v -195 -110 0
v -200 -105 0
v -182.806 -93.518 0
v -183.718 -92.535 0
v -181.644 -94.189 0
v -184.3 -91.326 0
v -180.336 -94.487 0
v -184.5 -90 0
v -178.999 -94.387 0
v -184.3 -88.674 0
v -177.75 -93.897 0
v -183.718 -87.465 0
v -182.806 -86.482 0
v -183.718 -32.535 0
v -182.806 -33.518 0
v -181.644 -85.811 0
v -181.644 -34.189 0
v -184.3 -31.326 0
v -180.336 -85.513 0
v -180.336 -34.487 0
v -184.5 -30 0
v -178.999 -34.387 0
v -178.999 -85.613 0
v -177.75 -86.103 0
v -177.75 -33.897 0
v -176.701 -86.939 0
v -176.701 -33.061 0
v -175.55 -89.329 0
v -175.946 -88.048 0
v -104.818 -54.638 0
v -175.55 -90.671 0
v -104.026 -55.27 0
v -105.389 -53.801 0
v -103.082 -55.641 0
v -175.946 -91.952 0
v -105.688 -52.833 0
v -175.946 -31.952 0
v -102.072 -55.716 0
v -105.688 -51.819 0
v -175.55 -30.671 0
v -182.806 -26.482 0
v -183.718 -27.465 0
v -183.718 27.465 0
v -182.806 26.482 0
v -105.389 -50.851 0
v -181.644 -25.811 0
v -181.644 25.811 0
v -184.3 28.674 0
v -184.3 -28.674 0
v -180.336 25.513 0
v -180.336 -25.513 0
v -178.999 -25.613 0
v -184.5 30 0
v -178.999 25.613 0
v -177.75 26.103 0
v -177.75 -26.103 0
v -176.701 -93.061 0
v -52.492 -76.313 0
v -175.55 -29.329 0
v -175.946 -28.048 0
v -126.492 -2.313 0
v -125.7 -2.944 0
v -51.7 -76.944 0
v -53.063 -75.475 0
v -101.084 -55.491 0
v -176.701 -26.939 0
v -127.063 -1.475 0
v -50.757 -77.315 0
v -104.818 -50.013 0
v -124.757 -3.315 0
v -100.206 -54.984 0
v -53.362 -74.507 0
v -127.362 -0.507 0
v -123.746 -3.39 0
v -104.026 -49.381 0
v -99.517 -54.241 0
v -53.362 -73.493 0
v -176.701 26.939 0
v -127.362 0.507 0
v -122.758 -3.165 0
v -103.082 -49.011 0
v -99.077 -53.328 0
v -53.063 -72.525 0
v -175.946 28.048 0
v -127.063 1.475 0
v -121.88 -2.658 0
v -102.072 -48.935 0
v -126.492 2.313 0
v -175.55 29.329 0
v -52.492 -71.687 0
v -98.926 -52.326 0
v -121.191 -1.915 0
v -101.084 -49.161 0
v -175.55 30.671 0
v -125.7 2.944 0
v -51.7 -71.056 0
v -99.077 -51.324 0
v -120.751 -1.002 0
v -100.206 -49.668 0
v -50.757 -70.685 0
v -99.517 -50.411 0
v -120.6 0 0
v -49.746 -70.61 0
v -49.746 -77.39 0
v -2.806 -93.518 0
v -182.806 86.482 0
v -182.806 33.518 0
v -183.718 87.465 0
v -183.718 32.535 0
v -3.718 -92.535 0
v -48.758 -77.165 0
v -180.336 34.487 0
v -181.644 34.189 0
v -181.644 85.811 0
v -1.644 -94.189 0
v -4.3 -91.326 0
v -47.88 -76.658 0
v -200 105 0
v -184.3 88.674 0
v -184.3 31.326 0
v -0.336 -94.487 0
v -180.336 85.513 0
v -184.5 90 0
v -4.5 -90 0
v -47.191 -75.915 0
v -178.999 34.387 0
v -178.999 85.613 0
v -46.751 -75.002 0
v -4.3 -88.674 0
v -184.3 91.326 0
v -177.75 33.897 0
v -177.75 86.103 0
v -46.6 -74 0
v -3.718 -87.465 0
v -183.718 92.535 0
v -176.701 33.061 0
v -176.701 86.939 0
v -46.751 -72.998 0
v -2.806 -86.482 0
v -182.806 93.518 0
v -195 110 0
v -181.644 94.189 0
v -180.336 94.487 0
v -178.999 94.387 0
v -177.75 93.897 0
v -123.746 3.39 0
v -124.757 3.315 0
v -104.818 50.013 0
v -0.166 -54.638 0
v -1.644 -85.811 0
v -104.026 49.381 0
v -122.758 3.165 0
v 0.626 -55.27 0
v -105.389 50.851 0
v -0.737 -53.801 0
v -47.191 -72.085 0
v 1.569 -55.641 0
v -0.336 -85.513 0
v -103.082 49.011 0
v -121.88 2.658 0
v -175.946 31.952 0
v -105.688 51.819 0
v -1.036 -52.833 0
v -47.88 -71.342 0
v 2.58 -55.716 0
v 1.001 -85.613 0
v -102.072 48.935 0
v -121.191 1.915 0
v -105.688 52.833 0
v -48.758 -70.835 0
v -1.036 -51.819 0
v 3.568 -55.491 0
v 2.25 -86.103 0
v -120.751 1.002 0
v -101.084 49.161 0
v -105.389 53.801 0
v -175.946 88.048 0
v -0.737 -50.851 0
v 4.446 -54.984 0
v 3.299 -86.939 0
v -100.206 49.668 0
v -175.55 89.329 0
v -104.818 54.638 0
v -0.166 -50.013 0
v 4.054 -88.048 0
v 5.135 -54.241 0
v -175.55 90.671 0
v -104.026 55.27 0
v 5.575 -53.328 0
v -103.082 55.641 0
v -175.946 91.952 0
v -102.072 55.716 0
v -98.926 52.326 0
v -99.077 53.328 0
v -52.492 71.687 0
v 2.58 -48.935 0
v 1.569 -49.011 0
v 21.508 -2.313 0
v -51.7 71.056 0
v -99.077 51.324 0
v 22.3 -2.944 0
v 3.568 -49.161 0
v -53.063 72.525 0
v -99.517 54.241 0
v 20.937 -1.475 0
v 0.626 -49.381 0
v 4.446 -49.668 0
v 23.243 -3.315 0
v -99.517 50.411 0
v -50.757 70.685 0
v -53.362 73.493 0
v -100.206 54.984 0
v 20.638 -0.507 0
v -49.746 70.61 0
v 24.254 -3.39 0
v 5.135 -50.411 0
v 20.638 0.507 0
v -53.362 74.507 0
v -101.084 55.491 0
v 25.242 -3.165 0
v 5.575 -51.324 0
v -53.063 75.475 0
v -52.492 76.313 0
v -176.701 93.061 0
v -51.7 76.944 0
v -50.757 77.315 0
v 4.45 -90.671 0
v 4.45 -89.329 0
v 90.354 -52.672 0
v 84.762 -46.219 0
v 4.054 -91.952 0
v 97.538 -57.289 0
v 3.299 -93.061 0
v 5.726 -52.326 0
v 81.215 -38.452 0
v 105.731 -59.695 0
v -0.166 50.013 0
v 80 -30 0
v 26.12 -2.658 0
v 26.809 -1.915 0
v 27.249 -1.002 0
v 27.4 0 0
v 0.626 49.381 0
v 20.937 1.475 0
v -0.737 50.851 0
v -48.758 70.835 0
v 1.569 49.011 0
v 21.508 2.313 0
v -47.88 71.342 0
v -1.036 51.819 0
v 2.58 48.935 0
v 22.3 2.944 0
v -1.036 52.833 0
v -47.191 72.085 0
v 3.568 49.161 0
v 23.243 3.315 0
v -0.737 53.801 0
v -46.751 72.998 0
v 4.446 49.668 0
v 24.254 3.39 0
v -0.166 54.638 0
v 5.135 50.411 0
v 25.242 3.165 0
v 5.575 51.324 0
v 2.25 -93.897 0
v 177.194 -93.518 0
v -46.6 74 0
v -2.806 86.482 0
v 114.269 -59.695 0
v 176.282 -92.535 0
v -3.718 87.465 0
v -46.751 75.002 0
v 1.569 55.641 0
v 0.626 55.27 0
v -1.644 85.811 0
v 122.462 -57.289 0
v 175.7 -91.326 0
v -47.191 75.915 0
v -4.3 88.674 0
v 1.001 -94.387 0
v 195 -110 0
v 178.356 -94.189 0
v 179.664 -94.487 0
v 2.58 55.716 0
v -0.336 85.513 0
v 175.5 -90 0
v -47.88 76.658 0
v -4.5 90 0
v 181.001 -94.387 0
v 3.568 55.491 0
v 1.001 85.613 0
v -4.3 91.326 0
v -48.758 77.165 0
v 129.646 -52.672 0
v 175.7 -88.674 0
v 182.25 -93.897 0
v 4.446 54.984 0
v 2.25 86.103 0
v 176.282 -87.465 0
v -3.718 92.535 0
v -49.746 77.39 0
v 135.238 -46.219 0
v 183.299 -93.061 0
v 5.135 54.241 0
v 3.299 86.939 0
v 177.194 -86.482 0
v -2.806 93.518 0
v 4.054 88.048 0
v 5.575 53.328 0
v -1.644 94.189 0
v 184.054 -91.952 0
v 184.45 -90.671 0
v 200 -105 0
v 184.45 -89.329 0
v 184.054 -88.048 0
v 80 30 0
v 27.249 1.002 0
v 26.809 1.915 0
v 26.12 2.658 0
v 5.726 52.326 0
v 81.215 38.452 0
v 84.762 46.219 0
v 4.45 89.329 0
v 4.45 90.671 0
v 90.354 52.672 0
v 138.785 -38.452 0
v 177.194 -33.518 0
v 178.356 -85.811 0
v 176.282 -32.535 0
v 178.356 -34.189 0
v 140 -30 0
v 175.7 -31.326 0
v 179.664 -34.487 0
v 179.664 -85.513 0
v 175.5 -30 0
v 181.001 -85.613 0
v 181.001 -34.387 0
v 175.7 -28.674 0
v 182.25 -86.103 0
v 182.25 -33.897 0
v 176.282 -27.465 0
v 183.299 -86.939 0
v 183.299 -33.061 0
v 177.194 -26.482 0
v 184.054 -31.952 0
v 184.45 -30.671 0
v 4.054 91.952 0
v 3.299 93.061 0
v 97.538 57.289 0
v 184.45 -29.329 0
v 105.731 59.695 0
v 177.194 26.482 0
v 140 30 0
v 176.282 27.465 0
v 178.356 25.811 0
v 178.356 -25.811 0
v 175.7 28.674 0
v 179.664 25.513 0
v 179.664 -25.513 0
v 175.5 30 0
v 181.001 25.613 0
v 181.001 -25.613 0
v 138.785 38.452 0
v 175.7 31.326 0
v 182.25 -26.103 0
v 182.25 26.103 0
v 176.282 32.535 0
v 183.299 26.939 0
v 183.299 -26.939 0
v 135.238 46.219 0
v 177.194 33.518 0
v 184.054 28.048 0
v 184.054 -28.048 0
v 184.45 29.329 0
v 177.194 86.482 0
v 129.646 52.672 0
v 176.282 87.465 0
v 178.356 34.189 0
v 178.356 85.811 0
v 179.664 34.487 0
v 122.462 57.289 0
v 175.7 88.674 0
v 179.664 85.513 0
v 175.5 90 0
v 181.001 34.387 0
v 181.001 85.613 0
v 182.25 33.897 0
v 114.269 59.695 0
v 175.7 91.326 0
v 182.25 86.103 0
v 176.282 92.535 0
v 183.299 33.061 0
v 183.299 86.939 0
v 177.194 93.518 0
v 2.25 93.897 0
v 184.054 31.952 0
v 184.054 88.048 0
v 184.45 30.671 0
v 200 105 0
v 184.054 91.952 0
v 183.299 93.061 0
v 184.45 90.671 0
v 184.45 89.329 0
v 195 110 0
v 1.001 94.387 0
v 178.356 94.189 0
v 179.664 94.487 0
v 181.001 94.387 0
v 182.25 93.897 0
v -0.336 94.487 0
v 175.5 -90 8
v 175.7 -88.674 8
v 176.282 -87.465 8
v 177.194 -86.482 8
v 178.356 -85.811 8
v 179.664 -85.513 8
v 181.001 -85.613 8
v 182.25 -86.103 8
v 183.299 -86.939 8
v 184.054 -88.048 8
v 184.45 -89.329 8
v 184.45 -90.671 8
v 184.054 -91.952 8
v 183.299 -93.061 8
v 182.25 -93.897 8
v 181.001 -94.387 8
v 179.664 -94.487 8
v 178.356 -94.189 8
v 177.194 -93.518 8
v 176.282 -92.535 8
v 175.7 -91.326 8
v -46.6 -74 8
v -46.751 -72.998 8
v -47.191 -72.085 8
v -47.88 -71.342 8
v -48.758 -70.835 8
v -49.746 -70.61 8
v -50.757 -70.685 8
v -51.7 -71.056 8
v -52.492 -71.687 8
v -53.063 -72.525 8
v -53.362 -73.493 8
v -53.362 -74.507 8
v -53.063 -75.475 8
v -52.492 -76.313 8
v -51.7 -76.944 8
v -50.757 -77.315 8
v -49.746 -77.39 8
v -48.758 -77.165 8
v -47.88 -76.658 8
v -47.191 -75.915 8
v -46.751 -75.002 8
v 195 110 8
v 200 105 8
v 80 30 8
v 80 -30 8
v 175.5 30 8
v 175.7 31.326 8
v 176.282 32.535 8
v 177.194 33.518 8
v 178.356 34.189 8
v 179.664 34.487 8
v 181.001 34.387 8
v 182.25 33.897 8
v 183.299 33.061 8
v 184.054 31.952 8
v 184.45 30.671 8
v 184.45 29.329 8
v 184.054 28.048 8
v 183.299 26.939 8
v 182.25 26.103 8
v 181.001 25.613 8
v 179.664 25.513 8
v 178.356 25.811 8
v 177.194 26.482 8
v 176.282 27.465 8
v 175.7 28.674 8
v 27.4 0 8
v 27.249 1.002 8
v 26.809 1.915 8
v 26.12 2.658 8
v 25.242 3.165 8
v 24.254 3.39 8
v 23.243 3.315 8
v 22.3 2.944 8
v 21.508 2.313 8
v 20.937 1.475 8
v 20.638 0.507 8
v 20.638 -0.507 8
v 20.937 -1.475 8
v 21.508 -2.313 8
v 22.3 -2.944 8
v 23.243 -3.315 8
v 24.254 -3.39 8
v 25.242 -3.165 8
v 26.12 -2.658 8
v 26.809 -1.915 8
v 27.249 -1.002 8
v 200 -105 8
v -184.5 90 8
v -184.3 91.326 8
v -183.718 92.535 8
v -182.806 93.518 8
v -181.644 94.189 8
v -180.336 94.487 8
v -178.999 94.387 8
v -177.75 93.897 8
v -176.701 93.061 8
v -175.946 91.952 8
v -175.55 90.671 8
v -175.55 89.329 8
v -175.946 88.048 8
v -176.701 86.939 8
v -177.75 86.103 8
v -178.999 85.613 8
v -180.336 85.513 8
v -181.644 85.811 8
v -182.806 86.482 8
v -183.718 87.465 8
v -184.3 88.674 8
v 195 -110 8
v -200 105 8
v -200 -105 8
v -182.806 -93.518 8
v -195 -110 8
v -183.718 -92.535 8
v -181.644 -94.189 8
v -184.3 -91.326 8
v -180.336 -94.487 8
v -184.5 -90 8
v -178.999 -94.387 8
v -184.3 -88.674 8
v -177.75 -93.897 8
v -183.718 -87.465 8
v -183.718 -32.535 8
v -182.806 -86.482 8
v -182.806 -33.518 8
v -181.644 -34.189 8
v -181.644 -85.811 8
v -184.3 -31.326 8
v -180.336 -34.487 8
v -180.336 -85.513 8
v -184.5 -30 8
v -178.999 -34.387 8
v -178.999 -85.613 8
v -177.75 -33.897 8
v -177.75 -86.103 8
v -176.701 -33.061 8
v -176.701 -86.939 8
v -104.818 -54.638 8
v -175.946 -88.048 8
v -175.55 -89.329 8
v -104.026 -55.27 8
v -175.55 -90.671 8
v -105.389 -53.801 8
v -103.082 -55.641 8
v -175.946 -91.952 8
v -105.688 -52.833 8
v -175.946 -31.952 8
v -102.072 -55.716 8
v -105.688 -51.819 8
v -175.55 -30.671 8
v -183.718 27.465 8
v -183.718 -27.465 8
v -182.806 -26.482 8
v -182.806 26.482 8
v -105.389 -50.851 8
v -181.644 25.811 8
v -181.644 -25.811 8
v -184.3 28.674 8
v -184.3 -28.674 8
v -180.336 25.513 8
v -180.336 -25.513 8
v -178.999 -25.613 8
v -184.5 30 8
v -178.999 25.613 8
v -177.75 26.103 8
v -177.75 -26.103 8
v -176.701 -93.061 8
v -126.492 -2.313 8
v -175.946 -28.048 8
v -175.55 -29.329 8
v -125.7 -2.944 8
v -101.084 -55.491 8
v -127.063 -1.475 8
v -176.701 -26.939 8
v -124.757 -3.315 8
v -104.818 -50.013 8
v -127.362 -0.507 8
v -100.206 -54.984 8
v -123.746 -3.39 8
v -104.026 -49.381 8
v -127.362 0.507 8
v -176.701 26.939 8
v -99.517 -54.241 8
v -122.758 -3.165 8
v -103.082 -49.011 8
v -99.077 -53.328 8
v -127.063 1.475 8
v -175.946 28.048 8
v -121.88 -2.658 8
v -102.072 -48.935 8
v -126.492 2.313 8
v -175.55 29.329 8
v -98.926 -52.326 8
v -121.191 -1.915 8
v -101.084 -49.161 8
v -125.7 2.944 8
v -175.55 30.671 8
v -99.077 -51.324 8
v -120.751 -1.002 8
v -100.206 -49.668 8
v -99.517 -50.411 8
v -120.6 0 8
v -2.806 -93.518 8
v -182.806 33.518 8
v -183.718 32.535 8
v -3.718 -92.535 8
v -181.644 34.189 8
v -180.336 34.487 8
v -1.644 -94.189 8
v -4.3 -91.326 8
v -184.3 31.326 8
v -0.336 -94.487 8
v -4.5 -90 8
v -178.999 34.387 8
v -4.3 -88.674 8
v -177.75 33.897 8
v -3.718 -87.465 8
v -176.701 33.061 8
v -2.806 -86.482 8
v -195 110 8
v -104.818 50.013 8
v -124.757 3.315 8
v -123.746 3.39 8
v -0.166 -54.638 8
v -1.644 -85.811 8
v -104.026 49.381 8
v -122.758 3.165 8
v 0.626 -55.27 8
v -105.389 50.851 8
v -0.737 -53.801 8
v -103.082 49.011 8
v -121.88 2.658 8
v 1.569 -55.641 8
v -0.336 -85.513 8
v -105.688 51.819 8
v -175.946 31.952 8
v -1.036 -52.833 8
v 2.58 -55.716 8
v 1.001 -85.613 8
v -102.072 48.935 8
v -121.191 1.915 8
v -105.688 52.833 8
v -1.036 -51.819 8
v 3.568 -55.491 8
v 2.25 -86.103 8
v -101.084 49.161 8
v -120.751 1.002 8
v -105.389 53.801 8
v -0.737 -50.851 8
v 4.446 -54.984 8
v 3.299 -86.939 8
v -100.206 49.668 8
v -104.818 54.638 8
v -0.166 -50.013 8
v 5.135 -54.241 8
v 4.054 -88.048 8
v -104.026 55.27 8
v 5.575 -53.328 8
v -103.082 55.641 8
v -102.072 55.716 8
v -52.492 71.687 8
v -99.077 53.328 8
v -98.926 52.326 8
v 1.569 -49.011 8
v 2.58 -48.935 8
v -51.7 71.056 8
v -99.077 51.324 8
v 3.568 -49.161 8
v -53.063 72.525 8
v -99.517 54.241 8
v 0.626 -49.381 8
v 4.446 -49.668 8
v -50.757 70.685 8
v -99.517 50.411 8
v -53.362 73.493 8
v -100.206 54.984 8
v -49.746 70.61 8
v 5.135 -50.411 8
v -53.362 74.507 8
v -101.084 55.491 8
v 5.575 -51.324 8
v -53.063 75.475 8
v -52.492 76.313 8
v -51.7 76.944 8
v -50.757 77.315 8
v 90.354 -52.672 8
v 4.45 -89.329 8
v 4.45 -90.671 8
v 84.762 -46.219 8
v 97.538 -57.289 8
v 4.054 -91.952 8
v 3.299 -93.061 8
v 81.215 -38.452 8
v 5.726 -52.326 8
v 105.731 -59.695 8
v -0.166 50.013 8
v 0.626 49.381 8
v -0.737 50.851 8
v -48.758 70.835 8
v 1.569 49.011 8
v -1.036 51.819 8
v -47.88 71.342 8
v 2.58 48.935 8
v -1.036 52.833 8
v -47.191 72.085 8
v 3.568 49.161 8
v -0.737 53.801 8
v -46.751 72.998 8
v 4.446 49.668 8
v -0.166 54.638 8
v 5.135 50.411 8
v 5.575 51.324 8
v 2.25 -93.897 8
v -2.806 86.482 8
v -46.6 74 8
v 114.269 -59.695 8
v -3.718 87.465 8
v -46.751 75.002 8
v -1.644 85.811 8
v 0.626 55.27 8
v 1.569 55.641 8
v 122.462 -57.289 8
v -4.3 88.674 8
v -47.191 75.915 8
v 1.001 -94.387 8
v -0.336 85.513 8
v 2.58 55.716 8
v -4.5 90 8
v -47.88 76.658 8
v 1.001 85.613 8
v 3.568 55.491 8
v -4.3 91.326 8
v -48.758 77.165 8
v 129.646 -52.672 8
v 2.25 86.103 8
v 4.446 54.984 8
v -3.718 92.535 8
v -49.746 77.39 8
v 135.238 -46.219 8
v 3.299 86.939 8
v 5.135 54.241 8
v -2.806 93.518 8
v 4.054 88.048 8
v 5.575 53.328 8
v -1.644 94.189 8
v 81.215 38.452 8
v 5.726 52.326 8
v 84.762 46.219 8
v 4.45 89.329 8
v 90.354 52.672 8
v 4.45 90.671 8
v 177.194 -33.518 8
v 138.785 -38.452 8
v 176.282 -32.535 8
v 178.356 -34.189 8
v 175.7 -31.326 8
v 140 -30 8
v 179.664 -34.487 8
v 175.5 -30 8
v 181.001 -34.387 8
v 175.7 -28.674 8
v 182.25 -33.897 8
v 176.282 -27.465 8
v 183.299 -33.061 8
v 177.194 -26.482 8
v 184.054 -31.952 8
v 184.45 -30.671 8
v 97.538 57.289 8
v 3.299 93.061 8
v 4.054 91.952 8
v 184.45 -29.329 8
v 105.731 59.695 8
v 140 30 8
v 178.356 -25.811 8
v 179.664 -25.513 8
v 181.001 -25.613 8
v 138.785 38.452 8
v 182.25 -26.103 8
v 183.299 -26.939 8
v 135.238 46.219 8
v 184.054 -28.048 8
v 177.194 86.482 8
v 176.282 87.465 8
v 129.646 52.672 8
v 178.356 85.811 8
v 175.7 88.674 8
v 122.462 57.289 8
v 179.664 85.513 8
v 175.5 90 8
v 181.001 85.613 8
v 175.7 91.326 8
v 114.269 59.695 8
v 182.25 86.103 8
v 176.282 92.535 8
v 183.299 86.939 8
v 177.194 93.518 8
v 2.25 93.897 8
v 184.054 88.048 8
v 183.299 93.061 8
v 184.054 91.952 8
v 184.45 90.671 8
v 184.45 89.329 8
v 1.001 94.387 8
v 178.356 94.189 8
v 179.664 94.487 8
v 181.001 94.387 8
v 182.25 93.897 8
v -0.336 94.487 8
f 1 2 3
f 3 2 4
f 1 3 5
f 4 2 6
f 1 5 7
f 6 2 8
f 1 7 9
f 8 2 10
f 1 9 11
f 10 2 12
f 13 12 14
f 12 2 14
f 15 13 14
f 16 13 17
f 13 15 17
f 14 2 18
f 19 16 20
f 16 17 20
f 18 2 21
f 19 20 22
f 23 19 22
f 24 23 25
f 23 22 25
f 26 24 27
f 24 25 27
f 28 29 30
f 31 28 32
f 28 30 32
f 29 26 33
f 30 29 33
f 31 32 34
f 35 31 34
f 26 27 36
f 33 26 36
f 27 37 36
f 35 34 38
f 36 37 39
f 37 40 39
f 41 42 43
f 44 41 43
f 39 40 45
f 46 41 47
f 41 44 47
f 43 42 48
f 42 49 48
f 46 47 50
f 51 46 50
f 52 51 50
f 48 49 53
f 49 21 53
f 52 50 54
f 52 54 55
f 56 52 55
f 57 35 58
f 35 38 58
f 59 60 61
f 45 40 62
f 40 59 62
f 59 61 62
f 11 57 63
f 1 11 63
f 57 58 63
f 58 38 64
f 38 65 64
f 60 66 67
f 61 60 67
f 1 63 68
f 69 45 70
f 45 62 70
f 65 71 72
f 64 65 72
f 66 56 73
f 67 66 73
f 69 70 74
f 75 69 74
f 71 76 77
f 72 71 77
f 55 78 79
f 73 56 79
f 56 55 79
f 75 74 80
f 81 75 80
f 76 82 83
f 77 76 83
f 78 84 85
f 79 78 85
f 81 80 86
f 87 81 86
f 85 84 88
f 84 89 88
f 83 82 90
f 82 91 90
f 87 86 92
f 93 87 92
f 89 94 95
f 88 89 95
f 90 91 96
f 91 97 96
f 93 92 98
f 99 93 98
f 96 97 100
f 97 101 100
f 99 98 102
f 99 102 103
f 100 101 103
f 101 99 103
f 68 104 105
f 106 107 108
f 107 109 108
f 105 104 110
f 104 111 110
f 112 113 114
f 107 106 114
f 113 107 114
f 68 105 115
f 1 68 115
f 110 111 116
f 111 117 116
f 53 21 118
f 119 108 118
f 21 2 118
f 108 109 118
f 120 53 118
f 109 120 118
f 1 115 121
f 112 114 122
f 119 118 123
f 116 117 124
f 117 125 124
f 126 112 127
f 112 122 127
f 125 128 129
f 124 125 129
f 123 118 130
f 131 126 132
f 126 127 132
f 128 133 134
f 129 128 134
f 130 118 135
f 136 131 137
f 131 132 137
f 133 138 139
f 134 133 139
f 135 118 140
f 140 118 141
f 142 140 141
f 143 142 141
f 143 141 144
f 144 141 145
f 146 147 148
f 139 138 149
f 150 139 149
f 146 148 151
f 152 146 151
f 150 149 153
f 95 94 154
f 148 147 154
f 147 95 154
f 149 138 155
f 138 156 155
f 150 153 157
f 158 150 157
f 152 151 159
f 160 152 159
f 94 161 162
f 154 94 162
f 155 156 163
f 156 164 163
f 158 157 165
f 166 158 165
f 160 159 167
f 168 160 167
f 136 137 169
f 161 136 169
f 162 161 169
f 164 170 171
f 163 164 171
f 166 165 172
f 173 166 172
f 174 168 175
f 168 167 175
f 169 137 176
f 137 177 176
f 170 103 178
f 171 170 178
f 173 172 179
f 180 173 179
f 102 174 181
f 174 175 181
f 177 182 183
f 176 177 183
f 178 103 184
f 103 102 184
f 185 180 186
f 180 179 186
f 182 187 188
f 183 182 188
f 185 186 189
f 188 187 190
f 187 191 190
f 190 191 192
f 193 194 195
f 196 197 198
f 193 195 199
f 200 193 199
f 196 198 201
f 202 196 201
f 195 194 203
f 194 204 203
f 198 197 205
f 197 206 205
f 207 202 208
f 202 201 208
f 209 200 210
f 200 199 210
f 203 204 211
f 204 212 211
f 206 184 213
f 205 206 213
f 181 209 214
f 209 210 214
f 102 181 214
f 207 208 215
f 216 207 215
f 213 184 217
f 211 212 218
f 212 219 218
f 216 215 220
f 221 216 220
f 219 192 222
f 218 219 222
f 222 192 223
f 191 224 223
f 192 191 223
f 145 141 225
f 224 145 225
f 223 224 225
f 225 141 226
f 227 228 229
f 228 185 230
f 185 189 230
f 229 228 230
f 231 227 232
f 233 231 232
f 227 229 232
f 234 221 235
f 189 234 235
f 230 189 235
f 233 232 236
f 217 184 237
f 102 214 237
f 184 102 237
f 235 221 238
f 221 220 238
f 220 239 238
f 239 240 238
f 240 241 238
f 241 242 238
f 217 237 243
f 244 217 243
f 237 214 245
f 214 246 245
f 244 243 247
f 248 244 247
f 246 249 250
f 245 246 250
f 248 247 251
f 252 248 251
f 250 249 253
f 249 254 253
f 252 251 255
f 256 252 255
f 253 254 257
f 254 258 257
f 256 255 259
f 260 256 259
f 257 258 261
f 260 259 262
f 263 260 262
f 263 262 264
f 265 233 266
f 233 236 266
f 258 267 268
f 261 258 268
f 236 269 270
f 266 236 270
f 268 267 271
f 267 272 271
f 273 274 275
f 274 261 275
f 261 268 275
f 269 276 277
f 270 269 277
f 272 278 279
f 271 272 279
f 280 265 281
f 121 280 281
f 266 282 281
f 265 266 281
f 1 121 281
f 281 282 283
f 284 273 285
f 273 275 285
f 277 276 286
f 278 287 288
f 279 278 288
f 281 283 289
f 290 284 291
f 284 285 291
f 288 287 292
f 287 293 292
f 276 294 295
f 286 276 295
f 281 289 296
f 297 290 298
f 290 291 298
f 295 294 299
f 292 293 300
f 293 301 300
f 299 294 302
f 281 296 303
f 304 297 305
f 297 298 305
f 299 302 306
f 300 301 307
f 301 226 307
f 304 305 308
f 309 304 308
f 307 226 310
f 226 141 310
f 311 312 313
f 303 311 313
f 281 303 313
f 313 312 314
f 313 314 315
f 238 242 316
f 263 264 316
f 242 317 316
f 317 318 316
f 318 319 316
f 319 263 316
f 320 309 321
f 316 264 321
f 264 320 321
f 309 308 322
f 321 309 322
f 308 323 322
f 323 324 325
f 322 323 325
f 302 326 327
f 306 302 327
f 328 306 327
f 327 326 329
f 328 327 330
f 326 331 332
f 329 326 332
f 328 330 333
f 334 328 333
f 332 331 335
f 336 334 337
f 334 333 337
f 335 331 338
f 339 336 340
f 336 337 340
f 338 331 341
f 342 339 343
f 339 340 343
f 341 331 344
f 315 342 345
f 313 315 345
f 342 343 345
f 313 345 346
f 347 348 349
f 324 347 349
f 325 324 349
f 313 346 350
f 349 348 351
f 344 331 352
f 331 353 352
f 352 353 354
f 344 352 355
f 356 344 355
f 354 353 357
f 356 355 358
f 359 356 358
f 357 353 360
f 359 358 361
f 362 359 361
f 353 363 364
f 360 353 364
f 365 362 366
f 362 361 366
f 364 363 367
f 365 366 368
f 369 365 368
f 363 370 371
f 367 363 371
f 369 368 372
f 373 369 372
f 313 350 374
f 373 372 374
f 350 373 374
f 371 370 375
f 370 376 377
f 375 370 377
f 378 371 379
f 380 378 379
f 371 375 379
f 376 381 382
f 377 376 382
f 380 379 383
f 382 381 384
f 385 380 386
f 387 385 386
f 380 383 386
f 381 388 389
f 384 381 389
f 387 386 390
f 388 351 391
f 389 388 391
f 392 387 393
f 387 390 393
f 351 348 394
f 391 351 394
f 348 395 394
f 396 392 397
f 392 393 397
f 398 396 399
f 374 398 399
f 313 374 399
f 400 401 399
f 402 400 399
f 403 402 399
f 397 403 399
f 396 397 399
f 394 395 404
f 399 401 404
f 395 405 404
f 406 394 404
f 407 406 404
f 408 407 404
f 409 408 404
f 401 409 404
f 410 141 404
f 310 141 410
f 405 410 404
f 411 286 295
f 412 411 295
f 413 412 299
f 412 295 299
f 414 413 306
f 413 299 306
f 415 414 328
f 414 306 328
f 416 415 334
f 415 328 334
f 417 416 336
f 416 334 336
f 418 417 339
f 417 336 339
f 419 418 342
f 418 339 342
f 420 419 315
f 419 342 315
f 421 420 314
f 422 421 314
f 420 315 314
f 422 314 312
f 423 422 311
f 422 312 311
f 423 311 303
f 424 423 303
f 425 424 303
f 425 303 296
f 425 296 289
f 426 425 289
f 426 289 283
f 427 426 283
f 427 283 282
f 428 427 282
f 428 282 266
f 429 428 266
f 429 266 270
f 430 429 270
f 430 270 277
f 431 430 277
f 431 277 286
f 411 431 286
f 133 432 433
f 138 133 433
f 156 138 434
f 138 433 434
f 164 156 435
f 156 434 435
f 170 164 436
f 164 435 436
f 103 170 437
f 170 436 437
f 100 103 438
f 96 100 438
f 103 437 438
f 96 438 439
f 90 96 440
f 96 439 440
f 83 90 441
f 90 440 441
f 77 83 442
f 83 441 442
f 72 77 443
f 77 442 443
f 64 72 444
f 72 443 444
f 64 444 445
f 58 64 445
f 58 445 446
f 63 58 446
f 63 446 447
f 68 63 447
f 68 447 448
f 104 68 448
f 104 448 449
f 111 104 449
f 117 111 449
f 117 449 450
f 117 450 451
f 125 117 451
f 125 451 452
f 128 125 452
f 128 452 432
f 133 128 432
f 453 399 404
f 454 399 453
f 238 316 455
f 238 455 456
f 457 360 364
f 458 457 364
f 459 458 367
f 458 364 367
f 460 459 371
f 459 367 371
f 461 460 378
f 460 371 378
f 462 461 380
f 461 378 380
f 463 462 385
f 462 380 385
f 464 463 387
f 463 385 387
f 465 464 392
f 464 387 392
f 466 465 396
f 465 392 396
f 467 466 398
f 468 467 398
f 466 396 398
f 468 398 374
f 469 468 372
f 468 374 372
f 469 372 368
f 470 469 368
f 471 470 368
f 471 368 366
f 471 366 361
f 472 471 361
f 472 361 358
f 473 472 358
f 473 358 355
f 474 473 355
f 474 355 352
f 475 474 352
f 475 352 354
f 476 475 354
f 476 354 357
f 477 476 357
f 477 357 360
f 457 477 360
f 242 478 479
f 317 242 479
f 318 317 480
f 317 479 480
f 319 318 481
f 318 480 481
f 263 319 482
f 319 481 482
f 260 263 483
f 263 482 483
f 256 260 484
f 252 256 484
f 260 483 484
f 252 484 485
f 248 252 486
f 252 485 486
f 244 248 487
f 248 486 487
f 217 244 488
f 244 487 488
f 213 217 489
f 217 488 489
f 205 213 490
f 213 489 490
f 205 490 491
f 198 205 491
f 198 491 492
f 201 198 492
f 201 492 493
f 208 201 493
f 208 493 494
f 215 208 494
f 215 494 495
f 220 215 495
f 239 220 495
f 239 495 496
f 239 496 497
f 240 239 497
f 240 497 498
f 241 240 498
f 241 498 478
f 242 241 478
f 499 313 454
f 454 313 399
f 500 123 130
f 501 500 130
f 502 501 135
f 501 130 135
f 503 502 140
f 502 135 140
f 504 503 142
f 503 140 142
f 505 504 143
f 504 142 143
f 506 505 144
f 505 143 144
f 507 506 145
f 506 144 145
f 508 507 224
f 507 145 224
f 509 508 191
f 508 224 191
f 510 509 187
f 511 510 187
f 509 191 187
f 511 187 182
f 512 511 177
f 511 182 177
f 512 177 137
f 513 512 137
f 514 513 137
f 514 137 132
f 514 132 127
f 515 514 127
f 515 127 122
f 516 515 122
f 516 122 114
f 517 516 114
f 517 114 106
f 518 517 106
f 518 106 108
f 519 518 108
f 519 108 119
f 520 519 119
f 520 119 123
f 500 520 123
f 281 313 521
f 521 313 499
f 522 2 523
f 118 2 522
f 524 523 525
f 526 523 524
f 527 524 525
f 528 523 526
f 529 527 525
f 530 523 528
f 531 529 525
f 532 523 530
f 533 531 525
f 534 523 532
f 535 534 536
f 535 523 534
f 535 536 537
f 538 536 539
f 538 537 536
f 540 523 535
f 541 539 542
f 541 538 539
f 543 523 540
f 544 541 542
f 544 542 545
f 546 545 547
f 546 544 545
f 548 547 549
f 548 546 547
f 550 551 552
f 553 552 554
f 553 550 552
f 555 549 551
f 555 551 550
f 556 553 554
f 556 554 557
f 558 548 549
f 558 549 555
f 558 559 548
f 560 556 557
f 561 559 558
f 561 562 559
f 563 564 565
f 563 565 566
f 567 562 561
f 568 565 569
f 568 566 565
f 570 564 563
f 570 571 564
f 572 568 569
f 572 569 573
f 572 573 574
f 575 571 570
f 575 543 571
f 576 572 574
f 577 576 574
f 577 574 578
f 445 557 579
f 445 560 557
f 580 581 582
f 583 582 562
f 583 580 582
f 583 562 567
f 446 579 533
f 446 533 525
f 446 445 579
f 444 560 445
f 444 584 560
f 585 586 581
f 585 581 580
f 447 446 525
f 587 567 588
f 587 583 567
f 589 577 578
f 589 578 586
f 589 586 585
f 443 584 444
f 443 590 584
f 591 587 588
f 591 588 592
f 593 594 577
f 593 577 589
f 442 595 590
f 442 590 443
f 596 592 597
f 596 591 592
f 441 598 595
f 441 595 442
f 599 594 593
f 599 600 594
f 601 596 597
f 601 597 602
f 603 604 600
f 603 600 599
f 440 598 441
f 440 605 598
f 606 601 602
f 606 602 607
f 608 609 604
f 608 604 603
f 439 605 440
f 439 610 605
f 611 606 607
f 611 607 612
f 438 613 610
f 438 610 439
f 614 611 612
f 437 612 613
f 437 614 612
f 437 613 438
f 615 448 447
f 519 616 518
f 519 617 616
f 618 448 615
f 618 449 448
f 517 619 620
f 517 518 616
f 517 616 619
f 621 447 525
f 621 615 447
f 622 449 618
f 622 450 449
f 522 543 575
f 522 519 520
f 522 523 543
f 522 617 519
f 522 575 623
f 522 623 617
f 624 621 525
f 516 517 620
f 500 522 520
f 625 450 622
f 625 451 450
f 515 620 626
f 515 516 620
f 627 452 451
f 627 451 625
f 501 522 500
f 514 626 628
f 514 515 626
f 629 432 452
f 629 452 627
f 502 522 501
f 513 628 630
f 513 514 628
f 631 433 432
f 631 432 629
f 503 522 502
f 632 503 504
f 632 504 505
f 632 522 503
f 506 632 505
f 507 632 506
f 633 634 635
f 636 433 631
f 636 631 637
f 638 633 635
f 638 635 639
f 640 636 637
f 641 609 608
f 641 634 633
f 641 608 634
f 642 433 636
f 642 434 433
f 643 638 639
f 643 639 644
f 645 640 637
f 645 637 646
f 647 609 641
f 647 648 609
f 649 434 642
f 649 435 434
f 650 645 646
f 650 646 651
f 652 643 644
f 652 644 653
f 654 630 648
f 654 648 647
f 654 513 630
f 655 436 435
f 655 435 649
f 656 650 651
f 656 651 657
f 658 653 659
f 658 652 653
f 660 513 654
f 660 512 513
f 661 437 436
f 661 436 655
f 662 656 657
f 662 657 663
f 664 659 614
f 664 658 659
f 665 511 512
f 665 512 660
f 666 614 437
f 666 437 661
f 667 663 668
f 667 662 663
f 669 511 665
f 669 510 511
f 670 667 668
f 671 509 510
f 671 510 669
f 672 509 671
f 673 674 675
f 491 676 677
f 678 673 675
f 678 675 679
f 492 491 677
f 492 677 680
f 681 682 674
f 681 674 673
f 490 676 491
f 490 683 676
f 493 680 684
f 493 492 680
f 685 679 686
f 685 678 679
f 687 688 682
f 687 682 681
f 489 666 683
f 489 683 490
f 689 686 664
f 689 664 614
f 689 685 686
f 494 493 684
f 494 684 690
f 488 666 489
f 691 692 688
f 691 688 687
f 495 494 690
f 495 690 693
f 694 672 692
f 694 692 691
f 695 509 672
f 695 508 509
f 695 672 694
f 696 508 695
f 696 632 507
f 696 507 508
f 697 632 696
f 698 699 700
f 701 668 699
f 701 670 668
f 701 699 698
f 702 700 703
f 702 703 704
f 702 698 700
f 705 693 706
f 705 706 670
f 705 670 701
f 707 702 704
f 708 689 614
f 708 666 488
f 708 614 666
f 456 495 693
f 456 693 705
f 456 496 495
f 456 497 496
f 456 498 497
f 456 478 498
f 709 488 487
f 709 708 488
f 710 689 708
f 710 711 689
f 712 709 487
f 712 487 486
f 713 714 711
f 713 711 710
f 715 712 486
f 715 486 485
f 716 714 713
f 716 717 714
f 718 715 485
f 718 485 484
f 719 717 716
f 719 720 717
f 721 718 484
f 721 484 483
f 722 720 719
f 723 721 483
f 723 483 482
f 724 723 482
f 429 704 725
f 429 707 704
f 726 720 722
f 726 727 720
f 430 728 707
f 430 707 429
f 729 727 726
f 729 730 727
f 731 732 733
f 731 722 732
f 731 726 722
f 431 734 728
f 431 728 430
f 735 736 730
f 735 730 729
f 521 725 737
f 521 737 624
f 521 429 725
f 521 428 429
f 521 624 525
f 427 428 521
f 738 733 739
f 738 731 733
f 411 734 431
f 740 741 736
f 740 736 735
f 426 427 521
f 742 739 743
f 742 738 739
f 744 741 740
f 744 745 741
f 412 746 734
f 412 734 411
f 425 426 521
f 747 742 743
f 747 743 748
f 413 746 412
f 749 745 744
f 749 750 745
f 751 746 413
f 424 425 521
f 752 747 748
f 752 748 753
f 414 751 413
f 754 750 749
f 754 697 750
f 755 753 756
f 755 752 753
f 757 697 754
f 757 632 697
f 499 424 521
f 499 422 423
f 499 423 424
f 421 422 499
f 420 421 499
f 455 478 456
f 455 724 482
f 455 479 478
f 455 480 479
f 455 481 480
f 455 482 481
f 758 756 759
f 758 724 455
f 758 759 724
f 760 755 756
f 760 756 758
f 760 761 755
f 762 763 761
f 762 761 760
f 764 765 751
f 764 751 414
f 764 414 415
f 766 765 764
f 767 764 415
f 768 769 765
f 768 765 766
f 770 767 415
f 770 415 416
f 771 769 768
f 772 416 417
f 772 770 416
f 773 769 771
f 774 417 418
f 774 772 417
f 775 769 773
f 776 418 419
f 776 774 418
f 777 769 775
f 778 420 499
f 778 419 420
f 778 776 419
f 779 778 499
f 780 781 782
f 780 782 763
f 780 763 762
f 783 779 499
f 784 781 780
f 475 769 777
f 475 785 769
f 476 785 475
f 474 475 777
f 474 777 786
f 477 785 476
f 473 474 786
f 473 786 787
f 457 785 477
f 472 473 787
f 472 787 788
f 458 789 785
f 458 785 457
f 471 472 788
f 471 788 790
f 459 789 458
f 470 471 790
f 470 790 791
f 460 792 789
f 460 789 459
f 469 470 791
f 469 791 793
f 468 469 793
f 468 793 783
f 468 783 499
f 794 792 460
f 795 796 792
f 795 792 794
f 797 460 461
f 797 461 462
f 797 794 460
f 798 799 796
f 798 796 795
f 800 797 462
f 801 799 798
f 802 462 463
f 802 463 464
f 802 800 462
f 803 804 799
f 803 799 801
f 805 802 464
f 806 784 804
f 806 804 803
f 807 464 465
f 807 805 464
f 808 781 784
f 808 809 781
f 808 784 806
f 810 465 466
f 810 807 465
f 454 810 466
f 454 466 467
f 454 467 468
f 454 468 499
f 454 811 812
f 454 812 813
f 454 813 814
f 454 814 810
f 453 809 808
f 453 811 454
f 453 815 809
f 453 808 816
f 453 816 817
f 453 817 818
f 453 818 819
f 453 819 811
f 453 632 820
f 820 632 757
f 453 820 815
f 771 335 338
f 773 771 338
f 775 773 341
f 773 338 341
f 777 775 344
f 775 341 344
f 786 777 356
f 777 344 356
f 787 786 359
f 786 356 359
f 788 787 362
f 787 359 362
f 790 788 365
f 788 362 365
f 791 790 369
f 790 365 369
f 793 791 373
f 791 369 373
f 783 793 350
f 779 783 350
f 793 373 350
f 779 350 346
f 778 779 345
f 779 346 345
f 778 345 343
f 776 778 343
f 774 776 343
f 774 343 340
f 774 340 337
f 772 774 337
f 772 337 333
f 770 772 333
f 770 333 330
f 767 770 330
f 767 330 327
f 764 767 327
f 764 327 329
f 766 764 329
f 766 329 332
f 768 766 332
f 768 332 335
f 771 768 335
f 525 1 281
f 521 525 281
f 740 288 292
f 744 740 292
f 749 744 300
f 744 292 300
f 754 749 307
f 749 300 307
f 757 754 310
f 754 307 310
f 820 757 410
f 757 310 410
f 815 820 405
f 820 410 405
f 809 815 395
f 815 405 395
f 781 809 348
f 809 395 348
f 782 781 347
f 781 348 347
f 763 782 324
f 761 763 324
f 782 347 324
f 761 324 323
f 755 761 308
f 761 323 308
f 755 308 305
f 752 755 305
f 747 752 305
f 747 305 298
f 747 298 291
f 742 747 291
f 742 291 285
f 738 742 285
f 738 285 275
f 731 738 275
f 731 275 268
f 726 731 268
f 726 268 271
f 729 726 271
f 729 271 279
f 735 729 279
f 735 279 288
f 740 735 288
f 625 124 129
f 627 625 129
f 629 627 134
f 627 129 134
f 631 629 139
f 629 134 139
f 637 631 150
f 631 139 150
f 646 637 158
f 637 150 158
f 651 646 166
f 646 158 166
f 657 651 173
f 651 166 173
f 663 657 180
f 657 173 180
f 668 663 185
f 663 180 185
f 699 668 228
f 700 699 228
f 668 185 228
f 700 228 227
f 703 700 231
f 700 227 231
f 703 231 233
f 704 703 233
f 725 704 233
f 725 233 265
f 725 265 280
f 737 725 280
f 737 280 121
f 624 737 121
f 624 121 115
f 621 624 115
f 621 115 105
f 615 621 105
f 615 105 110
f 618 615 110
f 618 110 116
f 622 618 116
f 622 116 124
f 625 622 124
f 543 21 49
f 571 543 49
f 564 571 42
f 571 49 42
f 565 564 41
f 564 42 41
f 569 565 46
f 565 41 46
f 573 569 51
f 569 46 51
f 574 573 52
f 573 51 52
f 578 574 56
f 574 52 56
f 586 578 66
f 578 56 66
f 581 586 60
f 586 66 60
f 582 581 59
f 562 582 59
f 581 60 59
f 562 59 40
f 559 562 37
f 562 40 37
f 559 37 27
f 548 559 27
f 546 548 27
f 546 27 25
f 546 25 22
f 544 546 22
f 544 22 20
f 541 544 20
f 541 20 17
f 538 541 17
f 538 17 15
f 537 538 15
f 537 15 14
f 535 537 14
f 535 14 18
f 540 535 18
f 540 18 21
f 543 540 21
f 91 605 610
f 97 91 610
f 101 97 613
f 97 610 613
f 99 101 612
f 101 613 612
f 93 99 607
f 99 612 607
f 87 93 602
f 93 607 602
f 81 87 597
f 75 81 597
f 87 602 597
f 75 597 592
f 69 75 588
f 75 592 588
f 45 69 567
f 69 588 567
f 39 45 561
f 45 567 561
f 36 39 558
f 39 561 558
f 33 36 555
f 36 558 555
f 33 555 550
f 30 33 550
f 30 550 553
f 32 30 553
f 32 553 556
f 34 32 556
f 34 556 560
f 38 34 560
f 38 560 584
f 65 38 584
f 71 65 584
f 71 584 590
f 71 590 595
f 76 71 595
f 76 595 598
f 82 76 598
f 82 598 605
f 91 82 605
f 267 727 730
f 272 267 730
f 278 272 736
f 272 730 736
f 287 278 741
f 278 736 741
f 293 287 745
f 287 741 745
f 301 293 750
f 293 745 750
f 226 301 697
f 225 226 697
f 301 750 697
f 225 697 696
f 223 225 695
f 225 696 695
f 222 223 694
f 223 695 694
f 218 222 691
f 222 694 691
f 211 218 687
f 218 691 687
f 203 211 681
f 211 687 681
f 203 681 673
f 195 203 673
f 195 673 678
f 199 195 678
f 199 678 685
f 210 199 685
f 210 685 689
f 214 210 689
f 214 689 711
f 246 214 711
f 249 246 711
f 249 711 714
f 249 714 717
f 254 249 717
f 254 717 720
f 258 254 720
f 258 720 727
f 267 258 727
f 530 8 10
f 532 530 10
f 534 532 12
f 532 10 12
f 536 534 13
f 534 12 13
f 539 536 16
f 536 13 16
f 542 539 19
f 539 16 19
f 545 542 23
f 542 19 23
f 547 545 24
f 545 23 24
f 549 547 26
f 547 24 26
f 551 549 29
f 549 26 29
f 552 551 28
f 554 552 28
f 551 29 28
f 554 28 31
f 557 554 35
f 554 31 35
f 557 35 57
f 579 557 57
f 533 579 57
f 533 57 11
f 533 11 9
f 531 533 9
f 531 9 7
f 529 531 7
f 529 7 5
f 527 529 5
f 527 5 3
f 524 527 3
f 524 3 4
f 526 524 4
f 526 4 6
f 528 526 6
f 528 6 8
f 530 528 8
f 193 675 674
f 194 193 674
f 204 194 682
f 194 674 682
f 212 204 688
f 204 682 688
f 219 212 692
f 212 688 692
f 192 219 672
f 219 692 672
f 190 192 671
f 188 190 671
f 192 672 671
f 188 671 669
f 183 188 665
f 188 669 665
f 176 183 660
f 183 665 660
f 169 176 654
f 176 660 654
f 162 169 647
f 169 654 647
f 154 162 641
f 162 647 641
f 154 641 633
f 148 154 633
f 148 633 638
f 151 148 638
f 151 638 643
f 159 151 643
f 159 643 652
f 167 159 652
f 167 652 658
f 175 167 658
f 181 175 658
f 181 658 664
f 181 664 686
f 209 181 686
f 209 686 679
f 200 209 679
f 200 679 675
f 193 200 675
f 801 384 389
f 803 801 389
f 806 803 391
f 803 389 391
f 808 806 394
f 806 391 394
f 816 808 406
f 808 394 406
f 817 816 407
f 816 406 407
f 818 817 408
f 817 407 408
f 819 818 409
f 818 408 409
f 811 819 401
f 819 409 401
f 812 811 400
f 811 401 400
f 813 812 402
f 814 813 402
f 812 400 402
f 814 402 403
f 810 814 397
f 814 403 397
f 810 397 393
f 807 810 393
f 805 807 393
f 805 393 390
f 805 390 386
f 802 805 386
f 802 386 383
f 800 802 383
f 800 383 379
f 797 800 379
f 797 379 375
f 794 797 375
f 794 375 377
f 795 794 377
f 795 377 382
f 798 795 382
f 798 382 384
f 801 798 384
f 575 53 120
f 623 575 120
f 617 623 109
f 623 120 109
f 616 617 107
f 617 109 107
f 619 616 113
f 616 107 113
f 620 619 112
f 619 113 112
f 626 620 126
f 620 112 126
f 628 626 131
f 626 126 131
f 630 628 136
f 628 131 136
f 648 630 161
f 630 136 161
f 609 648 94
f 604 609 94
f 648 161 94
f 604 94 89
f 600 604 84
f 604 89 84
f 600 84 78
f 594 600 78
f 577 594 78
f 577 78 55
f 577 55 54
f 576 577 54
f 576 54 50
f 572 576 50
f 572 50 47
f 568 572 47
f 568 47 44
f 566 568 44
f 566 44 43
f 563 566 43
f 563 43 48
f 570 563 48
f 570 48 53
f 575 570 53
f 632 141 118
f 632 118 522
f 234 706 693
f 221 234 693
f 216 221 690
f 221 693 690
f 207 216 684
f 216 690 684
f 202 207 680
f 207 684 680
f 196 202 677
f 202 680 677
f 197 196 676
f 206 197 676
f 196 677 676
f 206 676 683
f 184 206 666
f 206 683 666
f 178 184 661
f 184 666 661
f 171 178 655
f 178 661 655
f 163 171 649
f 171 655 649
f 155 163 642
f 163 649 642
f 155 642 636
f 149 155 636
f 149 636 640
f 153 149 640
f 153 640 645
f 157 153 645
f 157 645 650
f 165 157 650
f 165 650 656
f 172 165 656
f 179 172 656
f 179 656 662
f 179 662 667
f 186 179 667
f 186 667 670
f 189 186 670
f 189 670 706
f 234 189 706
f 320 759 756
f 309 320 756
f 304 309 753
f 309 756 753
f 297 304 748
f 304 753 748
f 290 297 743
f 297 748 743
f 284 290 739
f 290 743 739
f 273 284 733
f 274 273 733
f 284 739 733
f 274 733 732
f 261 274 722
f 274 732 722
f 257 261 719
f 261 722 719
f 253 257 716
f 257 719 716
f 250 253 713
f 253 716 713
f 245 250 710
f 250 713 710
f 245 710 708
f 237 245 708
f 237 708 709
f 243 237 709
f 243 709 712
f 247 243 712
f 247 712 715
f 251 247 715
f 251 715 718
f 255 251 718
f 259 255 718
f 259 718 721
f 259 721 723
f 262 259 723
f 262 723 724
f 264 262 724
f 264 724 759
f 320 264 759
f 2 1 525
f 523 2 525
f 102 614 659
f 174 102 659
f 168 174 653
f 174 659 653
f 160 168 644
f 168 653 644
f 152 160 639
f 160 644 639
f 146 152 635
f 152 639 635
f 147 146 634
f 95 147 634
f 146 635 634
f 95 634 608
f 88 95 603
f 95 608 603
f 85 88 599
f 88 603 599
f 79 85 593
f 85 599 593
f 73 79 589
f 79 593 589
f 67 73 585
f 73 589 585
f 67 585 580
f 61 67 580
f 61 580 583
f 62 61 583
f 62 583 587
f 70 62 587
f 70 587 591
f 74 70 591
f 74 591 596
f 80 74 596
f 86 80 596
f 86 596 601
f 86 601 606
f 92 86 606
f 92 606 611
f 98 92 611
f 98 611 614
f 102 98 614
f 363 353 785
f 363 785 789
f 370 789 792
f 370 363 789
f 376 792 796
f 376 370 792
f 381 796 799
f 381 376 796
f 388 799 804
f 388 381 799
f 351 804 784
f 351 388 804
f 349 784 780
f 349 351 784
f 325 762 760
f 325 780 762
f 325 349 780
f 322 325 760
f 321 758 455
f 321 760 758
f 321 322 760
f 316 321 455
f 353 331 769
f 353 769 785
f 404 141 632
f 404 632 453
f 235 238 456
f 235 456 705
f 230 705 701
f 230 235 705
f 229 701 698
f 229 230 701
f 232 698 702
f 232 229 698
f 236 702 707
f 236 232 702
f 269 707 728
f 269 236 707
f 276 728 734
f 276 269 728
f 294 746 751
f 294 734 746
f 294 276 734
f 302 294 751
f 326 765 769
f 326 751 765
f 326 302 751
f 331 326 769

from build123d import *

# Parameters (mm, degrees)
SKETCH_1_W             = 400
SKETCH_1_H             = 220
EXTRUDE_1_DEPTH        = 8
SKETCH_3_R             = 2.5
SKETCH_3_R_2           = 2.325901808
CUT_EXTRUDE_1_DEPTH    = 10
SKETCH_4_R             = 4.5
CUT_EXTRUDE_2_DEPTH    = 10
CUT_EXTRUDE_3_DEPTH    = 10
HOLE_WIZARD_M8_1_D     = 6.8
HOLE_WIZARD_M8_1_DEPTH = 8
HOLE_WIZARD_M8_2_D     = 6.8
HOLE_WIZARD_M8_2_DEPTH = 8
HOLE_WIZARD_M8_3_D     = 6.8
HOLE_WIZARD_M8_3_DEPTH = 8
CHAMFER_1_SIZE         = 5
SKETCH_12_R            = 4.5
CUT_EXTRUDE_4_DEPTH    = 10


with BuildPart() as part:
    # 草图1 → 凸台-拉伸1 (new body)
    with BuildSketch(Plane.XY):
        Rectangle(SKETCH_1_W, SKETCH_1_H)
    extrude(amount=EXTRUDE_1_DEPTH)

    # 草图3 → 切除-拉伸1 (cut)
    with BuildSketch(Plane.XY.offset(8)):
        with Locations((24, 0)):
            Circle(SKETCH_3_R)
        with Locations((-50, -74)):
            Circle(SKETCH_3_R)
        with Locations((-124, 0)):
            Circle(SKETCH_3_R)
        with Locations((-50, 74)):
            Circle(SKETCH_3_R)
        with Locations((2.325901808, 52.325901808)):
            Circle(SKETCH_3_R_2)
        with Locations((2.325901808, -52.325901808)):
            Circle(SKETCH_3_R_2)
        with Locations((-102.325901808, -52.325901808)):
            Circle(SKETCH_3_R_2)
        with Locations((-102.325901808, 52.325901808)):
            Circle(SKETCH_3_R_2)
    extrude(amount=-CUT_EXTRUDE_1_DEPTH, mode=Mode.SUBTRACT)

    # 草图4 → 切除-拉伸2 (cut)
    with BuildSketch(Plane(origin=(0, 0, 0), x_dir=(-1, 0, 0), z_dir=(0, 0, -1))):
        with Locations((180, 30)):
            Circle(SKETCH_4_R)
        with Locations((180, 90)):
            Circle(SKETCH_4_R)
        with Locations((180, -30)):
            Circle(SKETCH_4_R)
        with Locations((180, -90)):
            Circle(SKETCH_4_R)
        with Locations((-180, -90)):
            Circle(SKETCH_4_R)
        with Locations((-180, -30)):
            Circle(SKETCH_4_R)
        with Locations((-180, 90)):
            Circle(SKETCH_4_R)
        with Locations((-180, 30)):
            Circle(SKETCH_4_R)
    extrude(amount=-CUT_EXTRUDE_2_DEPTH, mode=Mode.SUBTRACT)

    # 草图5 → 切除-拉伸3 (cut)
    with BuildSketch(Plane(origin=(0, 0, 0), x_dir=(-1, 0, 0), z_dir=(0, 0, -1))):
        with BuildLine():
            Line((-80, 30), (-80, -30))
            ThreePointArc((-80, -30), (-110, -60), (-140, -30))
            Line((-140, -30), (-140, 30))
            ThreePointArc((-140, 30), (-110, 60), (-80, 30))
        make_face()
    extrude(amount=-CUT_EXTRUDE_3_DEPTH, mode=Mode.SUBTRACT)

    # M8 螺纹孔1
    with Locations(Plane(origin=(0, 0, 0), x_dir=(-1, 0, 0), z_dir=(0, 0, -1))):
        with Locations((50, 74), (124, 0), (50, -74), (-24, 0)):
            Hole(HOLE_WIZARD_M8_1_D / 2, depth=HOLE_WIZARD_M8_1_DEPTH)

    # M8 螺纹孔2
    with Locations(Plane(origin=(0, 0, 0), x_dir=(-1, 0, 0), z_dir=(0, 0, -1))):
        with Locations((-2.325901808, 52.325901808)):
            Hole(HOLE_WIZARD_M8_2_D / 2, depth=HOLE_WIZARD_M8_2_DEPTH)

    # M8 螺纹孔3
    with Locations(Plane(origin=(0, 0, 0), x_dir=(-1, 0, 0), z_dir=(0, 0, -1))):
        with Locations((102.325901808, 52.325901808), (102.325901808, -52.325901808), (-2.325901808, -52.325901808)):
            Hole(HOLE_WIZARD_M8_3_D / 2, depth=HOLE_WIZARD_M8_3_DEPTH)

    # 倒角1
    chamfer_1_edges = [part.edges().sort_by_distance(p)[0] for p in [
        (-200, 110, 4),
        (200, 110, 4),
        (200, -110, 4),
        (-200, -110, 4),
    ]]
    chamfer(chamfer_1_edges, length=CHAMFER_1_SIZE)

    # 草图12 → 切除-拉伸4 (cut)
    with BuildSketch(Plane(origin=(0, 0, 0), x_dir=(-1, 0, 0), z_dir=(0, 0, -1))):
        with Locations((0, 90)):
            Circle(SKETCH_12_R)
        with Locations((0, -90)):
            Circle(SKETCH_12_R)
    extrude(amount=-CUT_EXTRUDE_4_DEPTH, mode=Mode.SUBTRACT)


solid = part.part
